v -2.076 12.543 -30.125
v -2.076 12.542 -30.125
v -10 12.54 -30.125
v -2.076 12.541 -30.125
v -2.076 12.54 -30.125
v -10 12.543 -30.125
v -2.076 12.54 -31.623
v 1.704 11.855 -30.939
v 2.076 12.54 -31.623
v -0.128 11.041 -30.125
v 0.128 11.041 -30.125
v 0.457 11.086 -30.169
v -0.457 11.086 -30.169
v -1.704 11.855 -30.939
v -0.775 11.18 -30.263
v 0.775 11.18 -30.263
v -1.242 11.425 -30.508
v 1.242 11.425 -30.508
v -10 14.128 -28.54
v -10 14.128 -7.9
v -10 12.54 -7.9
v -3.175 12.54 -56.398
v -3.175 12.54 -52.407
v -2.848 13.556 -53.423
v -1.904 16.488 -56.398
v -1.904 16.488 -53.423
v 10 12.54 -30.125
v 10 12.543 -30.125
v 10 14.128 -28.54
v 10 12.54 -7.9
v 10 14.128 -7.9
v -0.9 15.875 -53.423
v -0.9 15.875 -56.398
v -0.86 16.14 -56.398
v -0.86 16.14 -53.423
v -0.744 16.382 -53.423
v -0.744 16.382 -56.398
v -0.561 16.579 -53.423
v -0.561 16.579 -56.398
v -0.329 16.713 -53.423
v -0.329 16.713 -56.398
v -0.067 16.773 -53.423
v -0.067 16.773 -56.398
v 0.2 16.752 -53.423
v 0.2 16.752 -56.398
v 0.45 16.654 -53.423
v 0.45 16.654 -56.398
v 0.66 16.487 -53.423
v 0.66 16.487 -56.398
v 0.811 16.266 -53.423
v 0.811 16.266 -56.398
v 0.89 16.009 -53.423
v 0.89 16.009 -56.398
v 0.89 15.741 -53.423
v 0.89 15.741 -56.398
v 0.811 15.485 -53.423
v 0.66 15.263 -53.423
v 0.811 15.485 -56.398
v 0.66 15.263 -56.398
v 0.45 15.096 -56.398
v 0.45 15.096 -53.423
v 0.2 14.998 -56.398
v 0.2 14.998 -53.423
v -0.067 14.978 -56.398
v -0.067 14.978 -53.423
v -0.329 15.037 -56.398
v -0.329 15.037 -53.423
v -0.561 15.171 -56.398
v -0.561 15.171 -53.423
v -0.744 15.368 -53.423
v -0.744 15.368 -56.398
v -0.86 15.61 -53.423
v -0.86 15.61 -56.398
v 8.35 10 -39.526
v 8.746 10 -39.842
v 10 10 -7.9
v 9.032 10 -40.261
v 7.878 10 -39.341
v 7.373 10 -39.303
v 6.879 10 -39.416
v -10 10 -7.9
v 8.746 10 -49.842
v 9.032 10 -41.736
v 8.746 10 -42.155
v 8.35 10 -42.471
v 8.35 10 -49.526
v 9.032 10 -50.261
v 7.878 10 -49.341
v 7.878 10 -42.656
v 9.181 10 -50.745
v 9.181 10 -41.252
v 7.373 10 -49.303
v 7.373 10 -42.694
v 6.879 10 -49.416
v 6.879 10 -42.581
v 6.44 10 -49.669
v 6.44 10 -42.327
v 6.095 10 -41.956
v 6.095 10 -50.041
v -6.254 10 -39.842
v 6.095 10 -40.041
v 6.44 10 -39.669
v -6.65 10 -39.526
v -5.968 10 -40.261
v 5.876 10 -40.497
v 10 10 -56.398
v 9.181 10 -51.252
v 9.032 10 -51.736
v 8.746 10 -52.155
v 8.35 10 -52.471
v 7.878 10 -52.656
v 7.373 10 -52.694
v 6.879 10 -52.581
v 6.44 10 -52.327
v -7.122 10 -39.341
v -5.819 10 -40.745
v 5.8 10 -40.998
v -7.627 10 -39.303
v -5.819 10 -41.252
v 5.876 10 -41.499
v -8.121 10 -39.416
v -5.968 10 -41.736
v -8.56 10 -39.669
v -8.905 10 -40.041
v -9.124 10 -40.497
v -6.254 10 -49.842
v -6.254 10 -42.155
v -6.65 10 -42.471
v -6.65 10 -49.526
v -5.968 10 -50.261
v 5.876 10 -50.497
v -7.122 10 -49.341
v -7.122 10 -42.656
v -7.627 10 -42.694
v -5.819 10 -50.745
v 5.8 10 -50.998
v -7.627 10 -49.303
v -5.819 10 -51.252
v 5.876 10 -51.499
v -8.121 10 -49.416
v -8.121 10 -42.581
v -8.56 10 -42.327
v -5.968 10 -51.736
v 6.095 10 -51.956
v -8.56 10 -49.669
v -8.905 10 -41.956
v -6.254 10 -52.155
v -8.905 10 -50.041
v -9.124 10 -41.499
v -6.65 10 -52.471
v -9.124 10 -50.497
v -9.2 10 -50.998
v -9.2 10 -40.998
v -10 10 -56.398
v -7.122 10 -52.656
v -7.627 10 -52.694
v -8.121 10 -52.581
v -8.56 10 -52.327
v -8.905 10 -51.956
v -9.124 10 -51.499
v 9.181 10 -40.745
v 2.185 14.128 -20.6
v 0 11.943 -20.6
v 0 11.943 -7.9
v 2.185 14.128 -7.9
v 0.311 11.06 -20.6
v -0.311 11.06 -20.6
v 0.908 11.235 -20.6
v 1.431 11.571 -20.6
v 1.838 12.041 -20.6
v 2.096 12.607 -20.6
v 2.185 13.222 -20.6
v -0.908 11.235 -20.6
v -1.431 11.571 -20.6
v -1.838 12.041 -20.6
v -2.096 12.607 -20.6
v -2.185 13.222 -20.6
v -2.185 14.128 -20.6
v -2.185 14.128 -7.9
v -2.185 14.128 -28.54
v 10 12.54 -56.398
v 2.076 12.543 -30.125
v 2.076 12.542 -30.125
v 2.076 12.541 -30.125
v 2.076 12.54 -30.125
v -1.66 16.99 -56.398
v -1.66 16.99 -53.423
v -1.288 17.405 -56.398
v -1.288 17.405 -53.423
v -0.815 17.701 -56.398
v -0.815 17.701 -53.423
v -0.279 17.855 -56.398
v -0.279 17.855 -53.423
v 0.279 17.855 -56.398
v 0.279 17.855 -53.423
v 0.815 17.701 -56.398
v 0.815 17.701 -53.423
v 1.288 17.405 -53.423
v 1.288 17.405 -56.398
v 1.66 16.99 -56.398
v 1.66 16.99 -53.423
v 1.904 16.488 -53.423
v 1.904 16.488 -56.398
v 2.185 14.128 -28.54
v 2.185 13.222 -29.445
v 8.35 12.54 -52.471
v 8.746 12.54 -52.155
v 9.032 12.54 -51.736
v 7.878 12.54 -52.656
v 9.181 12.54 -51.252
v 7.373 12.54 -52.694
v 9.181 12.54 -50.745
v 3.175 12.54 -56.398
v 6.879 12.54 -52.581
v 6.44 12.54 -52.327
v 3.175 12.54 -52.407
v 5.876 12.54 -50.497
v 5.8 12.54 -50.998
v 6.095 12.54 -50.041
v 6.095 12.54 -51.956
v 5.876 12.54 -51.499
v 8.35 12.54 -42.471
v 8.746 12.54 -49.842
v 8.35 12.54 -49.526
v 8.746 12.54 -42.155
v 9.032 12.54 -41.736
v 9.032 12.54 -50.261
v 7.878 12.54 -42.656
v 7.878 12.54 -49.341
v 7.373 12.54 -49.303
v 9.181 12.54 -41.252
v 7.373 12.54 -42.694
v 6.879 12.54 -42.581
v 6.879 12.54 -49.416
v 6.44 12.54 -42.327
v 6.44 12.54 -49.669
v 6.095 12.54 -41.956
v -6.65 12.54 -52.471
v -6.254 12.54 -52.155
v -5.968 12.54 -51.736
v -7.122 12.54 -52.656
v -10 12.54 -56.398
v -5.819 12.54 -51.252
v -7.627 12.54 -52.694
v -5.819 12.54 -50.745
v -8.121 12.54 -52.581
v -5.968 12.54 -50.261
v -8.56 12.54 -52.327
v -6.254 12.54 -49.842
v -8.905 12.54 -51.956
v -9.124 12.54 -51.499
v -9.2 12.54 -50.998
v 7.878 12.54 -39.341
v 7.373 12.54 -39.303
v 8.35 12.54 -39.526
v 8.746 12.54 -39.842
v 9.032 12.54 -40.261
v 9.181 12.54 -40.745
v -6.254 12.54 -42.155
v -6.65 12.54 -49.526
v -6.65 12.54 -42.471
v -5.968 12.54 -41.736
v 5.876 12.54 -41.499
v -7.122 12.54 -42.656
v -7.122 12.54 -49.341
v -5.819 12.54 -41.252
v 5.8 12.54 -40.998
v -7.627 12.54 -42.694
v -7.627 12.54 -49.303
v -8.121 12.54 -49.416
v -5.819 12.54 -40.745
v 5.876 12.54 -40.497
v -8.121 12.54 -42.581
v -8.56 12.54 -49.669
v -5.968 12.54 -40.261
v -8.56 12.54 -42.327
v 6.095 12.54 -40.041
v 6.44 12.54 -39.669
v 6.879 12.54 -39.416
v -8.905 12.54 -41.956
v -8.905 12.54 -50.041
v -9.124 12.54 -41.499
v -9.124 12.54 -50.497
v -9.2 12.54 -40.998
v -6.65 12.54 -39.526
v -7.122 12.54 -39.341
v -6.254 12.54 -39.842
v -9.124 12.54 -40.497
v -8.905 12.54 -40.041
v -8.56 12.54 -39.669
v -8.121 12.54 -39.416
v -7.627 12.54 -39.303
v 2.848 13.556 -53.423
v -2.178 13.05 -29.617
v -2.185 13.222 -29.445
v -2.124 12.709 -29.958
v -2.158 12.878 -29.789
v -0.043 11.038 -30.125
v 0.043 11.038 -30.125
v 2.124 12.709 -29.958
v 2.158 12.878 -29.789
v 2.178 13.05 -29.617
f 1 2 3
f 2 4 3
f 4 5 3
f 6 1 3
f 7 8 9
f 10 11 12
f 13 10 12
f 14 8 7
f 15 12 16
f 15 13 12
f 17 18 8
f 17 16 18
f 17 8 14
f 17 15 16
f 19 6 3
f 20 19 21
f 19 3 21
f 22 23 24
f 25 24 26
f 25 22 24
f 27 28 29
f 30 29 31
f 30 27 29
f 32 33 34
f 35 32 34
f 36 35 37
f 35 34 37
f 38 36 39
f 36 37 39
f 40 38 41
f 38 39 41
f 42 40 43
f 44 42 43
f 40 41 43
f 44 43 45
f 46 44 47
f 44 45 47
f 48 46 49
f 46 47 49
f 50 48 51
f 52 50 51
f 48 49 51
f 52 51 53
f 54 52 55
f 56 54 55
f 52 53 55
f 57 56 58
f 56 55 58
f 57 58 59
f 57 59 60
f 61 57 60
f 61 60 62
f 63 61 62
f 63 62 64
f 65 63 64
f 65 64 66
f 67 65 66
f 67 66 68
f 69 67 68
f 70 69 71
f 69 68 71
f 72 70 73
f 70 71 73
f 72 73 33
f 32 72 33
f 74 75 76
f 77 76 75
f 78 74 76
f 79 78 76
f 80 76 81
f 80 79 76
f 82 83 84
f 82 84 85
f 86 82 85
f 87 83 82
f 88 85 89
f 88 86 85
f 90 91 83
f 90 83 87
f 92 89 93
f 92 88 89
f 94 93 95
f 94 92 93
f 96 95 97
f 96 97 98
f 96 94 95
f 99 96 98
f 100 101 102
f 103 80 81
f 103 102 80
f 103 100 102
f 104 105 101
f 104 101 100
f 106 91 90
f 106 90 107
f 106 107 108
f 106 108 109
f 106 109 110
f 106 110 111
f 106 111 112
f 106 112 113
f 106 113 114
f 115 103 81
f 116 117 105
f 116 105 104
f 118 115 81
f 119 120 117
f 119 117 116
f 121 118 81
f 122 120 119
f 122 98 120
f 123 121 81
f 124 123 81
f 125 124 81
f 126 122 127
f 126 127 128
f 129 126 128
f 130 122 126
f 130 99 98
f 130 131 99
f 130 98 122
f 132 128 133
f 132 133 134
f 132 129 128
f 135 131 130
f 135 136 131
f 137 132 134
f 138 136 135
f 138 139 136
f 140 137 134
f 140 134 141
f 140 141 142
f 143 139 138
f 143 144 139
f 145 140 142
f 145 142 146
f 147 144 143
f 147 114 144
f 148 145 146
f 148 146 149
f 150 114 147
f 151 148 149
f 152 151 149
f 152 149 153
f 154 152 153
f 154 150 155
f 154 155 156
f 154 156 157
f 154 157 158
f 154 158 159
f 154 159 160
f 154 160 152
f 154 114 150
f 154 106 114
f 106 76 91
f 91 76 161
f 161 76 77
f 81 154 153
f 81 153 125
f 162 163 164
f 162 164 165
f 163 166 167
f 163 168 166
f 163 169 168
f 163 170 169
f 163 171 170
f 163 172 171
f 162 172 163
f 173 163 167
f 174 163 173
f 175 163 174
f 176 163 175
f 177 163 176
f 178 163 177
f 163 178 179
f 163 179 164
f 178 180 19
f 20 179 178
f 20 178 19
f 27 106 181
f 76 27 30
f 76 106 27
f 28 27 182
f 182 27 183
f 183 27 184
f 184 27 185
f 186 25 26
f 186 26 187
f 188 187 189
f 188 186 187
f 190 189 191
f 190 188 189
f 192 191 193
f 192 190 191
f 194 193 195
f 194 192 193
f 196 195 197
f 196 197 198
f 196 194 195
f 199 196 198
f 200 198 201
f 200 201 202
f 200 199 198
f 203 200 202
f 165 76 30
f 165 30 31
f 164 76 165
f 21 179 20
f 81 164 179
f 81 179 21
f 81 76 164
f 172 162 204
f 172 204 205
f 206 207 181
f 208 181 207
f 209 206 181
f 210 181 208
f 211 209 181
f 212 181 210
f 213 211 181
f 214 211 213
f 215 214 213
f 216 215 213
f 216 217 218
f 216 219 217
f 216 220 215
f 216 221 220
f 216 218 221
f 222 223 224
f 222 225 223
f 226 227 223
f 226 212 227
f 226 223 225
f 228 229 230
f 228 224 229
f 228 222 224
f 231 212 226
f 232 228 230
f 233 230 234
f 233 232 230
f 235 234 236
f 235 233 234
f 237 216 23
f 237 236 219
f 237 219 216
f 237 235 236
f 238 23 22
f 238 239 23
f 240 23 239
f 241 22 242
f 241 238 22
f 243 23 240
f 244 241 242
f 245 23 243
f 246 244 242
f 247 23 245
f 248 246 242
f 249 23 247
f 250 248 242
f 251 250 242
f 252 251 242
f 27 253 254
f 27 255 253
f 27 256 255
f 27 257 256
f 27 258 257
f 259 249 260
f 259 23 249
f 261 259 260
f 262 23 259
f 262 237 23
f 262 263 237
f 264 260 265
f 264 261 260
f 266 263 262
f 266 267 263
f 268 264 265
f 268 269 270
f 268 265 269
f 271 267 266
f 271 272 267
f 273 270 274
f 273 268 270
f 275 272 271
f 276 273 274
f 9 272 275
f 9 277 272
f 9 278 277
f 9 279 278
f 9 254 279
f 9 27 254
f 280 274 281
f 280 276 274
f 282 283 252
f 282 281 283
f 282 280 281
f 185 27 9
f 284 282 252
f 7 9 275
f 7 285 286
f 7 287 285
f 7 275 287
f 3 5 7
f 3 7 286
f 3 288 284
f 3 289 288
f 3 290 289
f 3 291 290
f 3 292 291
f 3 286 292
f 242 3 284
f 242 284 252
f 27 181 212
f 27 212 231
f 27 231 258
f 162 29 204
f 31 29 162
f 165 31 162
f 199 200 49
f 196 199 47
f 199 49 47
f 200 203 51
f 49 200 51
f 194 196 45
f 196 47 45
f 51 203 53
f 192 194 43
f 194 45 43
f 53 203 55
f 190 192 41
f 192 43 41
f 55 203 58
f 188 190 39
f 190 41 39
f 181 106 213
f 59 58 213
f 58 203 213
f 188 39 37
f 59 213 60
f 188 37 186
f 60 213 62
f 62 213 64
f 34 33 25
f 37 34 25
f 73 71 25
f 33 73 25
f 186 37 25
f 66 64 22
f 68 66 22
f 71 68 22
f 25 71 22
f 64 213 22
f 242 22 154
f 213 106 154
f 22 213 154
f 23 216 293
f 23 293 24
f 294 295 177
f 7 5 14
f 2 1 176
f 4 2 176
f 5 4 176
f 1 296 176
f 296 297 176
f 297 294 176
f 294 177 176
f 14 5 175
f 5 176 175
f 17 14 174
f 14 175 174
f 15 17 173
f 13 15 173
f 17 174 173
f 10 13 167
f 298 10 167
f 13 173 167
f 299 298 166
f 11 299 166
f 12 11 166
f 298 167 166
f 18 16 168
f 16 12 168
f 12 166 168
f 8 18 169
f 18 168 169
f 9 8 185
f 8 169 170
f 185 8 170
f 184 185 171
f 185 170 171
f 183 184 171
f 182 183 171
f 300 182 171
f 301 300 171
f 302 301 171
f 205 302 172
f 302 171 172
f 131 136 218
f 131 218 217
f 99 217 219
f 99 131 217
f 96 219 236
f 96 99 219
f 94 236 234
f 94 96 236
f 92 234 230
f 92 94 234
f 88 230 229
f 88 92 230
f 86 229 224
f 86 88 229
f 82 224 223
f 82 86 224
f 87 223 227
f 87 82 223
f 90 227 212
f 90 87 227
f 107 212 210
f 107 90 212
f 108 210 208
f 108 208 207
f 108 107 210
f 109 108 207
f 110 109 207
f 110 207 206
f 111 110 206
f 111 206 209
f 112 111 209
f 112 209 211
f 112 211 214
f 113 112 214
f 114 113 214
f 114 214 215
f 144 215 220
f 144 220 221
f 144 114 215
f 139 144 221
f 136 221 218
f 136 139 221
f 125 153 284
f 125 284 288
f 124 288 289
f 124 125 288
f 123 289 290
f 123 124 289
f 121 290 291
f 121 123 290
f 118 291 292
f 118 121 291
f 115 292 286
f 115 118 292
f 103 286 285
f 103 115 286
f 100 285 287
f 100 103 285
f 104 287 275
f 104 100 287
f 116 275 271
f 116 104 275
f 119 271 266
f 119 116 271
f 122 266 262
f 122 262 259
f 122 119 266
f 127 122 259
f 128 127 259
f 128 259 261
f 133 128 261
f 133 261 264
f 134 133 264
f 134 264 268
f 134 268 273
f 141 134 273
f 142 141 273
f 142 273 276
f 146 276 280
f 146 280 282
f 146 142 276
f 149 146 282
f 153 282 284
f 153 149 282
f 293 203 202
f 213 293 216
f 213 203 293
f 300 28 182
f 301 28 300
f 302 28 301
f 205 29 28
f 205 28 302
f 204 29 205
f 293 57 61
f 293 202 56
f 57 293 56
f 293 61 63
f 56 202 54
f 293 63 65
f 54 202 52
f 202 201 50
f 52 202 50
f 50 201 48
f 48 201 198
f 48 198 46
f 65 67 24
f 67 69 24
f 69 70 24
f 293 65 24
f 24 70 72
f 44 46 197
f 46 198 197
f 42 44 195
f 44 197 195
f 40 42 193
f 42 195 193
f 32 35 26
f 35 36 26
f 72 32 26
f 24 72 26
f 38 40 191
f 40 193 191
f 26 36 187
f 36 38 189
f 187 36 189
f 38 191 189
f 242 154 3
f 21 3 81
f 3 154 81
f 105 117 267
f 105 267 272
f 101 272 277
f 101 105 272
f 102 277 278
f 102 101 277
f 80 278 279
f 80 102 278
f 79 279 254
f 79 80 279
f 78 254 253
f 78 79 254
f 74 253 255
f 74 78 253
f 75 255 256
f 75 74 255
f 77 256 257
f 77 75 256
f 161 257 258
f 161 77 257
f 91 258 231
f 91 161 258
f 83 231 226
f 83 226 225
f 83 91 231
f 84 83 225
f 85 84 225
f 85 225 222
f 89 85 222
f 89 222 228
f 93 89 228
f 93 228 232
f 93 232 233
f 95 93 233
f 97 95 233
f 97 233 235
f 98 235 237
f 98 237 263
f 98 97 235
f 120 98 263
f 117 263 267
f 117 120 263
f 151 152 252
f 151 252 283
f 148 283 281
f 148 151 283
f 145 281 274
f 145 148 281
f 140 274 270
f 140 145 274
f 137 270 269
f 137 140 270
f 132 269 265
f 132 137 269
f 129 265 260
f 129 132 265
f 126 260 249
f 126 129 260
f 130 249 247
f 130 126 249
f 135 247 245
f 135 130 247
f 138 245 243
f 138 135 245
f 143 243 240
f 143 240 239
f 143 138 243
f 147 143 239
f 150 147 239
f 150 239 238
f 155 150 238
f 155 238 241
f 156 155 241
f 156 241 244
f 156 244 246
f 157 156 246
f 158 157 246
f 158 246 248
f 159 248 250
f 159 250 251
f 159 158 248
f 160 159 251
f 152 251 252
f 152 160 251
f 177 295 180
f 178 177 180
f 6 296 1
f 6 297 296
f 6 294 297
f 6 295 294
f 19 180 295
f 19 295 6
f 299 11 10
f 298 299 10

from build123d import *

# Parameters (mm, degrees)
SKETCH061_W     = 19.99996
SKETCH061_H     = 48.49876
SKETCH061_R     = 1.7
PAD018_DEPTH    = 2.54
SKETCH038_W     = 20
SKETCH038_H     = 22.225
PAD004_DEPTH    = 1.5875
POCKET005_DEPTH = 12.7
POCKET006_DEPTH = 9.525
CHAMFER_SIZE    = 1.4986
SKETCH062_R     = 0.9
PAD019_DEPTH    = 2.975
CHAMFER002_SIZE = 1.016
CHAMFER005_SIZE = 1.58496


with BuildPart() as part:
    # Sketch061 → Pad018 (new body)
    with BuildSketch(Plane(origin=(0, 10, -45.999574), x_dir=(-1, 0, 0), z_dir=(0, 1, 0))):
        with Locations((0, 13.85062)):
            Rectangle(SKETCH061_W, SKETCH061_H)
        with Locations((-7.5, 5.00124)):
            Circle(SKETCH061_R, mode=Mode.SUBTRACT)
        with Locations((-7.5, -4.99876)):
            Circle(SKETCH061_R, mode=Mode.SUBTRACT)
        with Locations((7.5, -4.99876)):
            Circle(SKETCH061_R, mode=Mode.SUBTRACT)
        with Locations((7.5, 5.00124)):
            Circle(SKETCH061_R, mode=Mode.SUBTRACT)
    extrude(amount=PAD018_DEPTH)

    # Sketch038 (on Face10 of Pad018) → Pad004 (join)
    with BuildSketch(Plane(origin=(0, 12.54, -45.999574), x_dir=(-1, 0, 0), z_dir=(0, 1, 0))):
        with Locations((0, 26.9875)):
            Rectangle(SKETCH038_W, SKETCH038_H)
    extrude(amount=PAD004_DEPTH)

    # Sketch040 (on Face5 of Pad004) → Pocket005 (cut)
    with BuildSketch(Plane(origin=(0, 10, -7.899574), x_dir=(1, 0, 0), z_dir=(0, 0, 1))):
        Polygon((-2.184862, 4.1275), (0, 1.942638), (2.184862, 4.1275), align=None)
    extrude(amount=-POCKET005_DEPTH, mode=Mode.SUBTRACT)

    # Sketch037 (on Face18 of Pocket005) → Pocket006 (cut)
    with BuildSketch(Plane(origin=(0, 10, -20.599574), x_dir=(1, 0, 0), z_dir=(0, 0, 1))):
        with BuildLine():
            Line((-2.184862, 3.2225), (-2.184862, 4.1275))
            Line((-2.184862, 4.1275), (2.184862, 4.1275))
            Line((2.184862, 4.1275), (2.184862, 3.2225))
            ThreePointArc((-2.184862, 3.2225), (0, 1.037638), (2.184862, 3.2225))
        make_face()
    extrude(amount=-POCKET006_DEPTH, mode=Mode.SUBTRACT)

    # Chamfer
    chamfer_edges = [part.edges().sort_by_distance(p)[0] for p in [
        (0, 12.54, -30.124574),
    ]]
    chamfer(chamfer_edges, length=CHAMFER_SIZE)

    # Sketch062 (on Face6 of Chamfer) → Pad019 (join)
    with BuildSketch(Plane(origin=(0, 10, -56.398334), x_dir=(-1, 0, 0), z_dir=(0, 0, -1))):
        with BuildLine():
            Line((-3.175, 2.54), (-3.175, 0))
            Line((-3.175, 0), (3.175, 0))
            Line((3.175, 0), (3.175, 2.54))
            Line((3.175, 2.54), (1.90374, 6.488023))
            ThreePointArc((1.90374, 6.488023), (0, 7.87502), (-1.90374, 6.488023))
            Line((-1.90374, 6.488023), (-3.175, 2.54))
        make_face()
        with Locations((0, 5.87502)):
            Circle(SKETCH062_R, mode=Mode.SUBTRACT)
    extrude(amount=-PAD019_DEPTH)

    # Chamfer002
    chamfer002_edges = [part.edges().sort_by_distance(p)[0] for p in [
        (0, 12.54, -53.423334),
    ]]
    chamfer(chamfer002_edges, length=CHAMFER002_SIZE)

    # Chamfer005
    chamfer005_edges = [part.edges().sort_by_distance(p)[0] for p in [
        (6.092431, 14.1275, -30.124574),
        (-6.092431, 14.1275, -30.124574),
    ]]
    chamfer(chamfer005_edges, length=CHAMFER005_SIZE)


solid = part.part
